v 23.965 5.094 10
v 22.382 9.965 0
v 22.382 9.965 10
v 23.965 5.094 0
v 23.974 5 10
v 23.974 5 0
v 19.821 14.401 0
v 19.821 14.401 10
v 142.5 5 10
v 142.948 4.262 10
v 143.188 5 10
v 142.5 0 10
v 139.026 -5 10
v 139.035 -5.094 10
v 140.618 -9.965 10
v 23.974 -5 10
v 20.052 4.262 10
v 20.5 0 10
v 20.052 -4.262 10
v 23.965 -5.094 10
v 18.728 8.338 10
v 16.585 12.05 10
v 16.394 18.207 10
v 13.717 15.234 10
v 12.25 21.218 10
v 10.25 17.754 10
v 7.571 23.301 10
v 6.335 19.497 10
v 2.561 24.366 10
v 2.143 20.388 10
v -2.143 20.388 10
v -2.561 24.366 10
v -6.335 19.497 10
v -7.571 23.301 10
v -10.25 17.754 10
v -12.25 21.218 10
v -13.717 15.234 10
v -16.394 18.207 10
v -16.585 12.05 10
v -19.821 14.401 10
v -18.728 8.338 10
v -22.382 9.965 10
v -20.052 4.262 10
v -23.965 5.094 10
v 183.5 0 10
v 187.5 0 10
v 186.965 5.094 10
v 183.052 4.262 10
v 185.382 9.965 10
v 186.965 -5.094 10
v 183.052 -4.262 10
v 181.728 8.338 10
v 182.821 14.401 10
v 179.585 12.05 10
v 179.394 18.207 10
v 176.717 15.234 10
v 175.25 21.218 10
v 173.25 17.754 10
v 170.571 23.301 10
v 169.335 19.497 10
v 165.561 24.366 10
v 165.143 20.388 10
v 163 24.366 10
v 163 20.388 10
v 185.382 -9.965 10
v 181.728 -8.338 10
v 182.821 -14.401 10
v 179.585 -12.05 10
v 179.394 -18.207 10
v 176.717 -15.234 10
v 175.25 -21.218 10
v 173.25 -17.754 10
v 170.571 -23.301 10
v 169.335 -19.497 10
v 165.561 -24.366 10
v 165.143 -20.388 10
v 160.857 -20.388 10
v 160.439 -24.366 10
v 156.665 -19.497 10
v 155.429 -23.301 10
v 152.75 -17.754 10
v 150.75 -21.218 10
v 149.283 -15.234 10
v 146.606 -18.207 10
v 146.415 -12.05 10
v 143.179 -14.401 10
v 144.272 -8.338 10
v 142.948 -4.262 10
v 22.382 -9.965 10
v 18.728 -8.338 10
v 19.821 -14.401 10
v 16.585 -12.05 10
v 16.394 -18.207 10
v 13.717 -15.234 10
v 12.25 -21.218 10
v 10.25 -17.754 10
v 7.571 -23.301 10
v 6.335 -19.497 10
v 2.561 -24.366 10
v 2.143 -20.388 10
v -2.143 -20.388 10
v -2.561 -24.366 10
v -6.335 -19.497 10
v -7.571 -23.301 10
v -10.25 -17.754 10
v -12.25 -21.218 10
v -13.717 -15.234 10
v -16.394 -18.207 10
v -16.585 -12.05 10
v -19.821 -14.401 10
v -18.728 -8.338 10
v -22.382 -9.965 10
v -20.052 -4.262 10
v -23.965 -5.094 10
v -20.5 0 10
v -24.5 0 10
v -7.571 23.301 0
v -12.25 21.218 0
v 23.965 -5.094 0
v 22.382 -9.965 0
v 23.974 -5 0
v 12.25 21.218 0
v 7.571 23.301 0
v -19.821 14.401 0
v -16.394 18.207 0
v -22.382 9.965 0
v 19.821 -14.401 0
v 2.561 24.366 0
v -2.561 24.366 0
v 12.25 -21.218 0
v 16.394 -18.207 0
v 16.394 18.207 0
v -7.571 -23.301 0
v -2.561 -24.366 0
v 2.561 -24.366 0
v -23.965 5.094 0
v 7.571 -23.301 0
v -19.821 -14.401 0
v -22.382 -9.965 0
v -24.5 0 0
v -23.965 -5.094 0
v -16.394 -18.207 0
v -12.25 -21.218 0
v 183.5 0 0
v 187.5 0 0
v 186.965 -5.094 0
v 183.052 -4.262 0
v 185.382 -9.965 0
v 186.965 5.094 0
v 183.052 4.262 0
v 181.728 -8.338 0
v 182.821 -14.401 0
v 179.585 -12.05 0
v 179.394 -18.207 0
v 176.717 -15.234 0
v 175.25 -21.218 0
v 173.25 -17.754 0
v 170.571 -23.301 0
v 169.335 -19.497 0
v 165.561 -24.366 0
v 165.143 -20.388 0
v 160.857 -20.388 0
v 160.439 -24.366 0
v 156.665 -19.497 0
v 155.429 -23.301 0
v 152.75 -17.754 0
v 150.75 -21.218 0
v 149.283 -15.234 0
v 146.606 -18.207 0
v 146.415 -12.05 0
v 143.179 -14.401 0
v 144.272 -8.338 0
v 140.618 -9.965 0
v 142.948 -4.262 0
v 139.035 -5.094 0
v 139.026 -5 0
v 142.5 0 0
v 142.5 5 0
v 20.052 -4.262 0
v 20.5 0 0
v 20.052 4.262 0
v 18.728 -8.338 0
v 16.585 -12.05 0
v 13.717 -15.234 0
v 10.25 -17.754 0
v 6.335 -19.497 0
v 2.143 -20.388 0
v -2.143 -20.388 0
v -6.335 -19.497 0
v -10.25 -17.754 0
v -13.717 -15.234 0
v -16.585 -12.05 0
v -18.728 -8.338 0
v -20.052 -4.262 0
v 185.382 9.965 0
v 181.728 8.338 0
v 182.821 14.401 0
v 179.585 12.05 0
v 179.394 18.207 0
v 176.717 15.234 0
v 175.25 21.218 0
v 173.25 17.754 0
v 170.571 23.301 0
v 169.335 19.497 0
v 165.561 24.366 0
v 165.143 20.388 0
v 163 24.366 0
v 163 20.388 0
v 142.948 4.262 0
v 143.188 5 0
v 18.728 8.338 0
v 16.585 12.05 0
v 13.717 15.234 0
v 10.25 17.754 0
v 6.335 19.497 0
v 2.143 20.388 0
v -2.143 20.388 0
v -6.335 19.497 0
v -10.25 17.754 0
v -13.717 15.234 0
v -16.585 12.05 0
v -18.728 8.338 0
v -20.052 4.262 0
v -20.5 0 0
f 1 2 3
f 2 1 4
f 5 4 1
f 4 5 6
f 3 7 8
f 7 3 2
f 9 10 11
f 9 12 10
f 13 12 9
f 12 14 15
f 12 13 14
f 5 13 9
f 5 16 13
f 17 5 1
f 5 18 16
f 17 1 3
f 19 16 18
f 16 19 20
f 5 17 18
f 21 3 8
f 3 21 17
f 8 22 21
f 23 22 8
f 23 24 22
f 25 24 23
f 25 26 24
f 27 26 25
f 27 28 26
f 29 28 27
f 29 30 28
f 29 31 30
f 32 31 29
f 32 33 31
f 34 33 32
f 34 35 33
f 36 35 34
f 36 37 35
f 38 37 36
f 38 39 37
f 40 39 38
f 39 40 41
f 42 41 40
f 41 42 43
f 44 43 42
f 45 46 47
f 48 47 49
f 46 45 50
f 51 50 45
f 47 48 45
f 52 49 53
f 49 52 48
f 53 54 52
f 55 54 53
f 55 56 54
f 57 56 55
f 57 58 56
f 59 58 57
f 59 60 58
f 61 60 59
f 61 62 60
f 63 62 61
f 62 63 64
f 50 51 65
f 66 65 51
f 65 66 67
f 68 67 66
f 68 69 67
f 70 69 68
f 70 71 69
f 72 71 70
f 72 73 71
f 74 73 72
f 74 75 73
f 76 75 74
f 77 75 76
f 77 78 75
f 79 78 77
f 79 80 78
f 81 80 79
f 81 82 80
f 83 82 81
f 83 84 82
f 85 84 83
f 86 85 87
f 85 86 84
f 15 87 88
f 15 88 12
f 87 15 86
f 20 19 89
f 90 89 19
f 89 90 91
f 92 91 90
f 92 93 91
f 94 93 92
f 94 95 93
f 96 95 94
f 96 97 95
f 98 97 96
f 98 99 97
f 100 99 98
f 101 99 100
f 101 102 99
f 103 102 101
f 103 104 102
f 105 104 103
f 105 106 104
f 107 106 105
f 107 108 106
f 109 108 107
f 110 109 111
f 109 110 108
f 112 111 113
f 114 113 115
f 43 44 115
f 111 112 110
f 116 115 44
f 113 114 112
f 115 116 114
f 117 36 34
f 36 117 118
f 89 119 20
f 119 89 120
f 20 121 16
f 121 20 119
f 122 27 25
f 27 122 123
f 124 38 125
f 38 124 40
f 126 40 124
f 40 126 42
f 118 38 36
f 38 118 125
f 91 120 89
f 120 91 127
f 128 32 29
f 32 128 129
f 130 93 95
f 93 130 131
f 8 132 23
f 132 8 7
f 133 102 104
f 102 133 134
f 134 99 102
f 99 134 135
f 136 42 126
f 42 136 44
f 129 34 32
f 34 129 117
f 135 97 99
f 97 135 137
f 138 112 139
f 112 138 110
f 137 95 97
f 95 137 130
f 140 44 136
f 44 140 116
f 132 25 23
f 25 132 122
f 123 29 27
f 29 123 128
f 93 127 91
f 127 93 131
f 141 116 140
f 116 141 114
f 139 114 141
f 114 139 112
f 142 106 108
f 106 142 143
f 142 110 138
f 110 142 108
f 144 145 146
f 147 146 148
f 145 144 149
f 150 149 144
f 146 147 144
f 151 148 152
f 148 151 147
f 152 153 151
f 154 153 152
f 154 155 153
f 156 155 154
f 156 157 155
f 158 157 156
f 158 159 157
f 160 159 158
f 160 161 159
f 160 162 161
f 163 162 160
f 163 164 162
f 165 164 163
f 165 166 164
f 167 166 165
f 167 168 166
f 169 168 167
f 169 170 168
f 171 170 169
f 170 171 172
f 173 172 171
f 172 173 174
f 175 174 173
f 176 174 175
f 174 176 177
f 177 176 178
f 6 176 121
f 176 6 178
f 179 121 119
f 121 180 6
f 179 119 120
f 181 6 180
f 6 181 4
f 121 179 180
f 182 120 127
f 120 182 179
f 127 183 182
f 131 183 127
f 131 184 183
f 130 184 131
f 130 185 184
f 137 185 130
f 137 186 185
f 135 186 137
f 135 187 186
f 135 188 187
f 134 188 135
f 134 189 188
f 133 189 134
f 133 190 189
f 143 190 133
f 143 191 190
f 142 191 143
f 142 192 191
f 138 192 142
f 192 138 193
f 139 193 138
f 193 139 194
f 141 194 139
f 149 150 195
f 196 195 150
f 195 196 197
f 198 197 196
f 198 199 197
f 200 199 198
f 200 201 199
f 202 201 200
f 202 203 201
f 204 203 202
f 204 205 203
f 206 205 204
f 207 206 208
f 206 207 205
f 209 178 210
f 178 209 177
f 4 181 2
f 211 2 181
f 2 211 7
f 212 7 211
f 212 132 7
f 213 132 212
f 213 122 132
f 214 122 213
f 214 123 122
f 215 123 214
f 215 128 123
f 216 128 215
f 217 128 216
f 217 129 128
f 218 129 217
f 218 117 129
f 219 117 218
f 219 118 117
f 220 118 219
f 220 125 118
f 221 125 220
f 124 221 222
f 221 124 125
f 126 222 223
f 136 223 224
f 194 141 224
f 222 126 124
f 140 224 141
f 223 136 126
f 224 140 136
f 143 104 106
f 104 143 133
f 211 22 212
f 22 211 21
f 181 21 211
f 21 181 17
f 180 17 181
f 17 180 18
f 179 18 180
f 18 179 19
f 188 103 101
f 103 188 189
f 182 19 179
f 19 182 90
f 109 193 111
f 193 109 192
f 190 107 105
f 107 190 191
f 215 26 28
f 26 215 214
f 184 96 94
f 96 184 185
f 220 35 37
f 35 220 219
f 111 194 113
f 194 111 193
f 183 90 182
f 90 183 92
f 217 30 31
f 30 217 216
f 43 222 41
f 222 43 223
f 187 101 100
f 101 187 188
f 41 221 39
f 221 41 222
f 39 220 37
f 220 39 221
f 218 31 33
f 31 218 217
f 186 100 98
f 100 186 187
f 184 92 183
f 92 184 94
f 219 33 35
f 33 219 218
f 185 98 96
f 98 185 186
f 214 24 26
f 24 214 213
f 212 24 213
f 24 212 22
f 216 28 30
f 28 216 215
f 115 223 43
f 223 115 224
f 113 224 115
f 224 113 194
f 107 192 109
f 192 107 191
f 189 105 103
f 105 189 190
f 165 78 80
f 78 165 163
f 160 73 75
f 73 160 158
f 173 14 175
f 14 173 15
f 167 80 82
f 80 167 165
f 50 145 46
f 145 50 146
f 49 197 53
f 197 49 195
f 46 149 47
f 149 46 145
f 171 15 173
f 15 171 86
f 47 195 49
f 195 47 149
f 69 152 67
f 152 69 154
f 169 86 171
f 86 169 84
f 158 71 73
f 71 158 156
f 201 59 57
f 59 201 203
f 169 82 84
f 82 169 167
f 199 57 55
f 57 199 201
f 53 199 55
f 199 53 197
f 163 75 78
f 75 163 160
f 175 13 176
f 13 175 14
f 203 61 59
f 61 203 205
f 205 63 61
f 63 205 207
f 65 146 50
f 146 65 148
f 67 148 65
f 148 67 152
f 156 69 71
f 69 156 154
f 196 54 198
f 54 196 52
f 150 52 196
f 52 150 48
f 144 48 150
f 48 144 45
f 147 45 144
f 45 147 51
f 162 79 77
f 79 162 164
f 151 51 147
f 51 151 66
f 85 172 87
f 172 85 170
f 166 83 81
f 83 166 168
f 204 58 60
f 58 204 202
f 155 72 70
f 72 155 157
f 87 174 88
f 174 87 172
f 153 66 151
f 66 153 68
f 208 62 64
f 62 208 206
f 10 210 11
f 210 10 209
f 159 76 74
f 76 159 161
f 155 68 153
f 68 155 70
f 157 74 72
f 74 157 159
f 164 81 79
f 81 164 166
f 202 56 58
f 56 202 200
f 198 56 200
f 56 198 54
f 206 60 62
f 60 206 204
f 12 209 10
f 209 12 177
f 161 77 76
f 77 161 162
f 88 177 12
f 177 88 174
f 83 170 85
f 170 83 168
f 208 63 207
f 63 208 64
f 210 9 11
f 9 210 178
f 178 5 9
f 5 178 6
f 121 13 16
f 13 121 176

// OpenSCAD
led_r = 41/2;
pipe_r = 55/2;
t = 4;
w = 10;
h = 120;

difference(){
	cylinder(h=w,r=led_r+t);
	cylinder(h=w,r=led_r);
}

translate([led_r+t/2,-w/2,0])
cube([h,w,w]);

translate([2*led_r+t/2+h,0,0])
difference(){
	cylinder(h=w,r=led_r+t);
	cylinder(h=w,r=led_r);
	translate([-(led_r+t),w/2,0])
	cube([led_r+t,led_r+t,w]);
}
